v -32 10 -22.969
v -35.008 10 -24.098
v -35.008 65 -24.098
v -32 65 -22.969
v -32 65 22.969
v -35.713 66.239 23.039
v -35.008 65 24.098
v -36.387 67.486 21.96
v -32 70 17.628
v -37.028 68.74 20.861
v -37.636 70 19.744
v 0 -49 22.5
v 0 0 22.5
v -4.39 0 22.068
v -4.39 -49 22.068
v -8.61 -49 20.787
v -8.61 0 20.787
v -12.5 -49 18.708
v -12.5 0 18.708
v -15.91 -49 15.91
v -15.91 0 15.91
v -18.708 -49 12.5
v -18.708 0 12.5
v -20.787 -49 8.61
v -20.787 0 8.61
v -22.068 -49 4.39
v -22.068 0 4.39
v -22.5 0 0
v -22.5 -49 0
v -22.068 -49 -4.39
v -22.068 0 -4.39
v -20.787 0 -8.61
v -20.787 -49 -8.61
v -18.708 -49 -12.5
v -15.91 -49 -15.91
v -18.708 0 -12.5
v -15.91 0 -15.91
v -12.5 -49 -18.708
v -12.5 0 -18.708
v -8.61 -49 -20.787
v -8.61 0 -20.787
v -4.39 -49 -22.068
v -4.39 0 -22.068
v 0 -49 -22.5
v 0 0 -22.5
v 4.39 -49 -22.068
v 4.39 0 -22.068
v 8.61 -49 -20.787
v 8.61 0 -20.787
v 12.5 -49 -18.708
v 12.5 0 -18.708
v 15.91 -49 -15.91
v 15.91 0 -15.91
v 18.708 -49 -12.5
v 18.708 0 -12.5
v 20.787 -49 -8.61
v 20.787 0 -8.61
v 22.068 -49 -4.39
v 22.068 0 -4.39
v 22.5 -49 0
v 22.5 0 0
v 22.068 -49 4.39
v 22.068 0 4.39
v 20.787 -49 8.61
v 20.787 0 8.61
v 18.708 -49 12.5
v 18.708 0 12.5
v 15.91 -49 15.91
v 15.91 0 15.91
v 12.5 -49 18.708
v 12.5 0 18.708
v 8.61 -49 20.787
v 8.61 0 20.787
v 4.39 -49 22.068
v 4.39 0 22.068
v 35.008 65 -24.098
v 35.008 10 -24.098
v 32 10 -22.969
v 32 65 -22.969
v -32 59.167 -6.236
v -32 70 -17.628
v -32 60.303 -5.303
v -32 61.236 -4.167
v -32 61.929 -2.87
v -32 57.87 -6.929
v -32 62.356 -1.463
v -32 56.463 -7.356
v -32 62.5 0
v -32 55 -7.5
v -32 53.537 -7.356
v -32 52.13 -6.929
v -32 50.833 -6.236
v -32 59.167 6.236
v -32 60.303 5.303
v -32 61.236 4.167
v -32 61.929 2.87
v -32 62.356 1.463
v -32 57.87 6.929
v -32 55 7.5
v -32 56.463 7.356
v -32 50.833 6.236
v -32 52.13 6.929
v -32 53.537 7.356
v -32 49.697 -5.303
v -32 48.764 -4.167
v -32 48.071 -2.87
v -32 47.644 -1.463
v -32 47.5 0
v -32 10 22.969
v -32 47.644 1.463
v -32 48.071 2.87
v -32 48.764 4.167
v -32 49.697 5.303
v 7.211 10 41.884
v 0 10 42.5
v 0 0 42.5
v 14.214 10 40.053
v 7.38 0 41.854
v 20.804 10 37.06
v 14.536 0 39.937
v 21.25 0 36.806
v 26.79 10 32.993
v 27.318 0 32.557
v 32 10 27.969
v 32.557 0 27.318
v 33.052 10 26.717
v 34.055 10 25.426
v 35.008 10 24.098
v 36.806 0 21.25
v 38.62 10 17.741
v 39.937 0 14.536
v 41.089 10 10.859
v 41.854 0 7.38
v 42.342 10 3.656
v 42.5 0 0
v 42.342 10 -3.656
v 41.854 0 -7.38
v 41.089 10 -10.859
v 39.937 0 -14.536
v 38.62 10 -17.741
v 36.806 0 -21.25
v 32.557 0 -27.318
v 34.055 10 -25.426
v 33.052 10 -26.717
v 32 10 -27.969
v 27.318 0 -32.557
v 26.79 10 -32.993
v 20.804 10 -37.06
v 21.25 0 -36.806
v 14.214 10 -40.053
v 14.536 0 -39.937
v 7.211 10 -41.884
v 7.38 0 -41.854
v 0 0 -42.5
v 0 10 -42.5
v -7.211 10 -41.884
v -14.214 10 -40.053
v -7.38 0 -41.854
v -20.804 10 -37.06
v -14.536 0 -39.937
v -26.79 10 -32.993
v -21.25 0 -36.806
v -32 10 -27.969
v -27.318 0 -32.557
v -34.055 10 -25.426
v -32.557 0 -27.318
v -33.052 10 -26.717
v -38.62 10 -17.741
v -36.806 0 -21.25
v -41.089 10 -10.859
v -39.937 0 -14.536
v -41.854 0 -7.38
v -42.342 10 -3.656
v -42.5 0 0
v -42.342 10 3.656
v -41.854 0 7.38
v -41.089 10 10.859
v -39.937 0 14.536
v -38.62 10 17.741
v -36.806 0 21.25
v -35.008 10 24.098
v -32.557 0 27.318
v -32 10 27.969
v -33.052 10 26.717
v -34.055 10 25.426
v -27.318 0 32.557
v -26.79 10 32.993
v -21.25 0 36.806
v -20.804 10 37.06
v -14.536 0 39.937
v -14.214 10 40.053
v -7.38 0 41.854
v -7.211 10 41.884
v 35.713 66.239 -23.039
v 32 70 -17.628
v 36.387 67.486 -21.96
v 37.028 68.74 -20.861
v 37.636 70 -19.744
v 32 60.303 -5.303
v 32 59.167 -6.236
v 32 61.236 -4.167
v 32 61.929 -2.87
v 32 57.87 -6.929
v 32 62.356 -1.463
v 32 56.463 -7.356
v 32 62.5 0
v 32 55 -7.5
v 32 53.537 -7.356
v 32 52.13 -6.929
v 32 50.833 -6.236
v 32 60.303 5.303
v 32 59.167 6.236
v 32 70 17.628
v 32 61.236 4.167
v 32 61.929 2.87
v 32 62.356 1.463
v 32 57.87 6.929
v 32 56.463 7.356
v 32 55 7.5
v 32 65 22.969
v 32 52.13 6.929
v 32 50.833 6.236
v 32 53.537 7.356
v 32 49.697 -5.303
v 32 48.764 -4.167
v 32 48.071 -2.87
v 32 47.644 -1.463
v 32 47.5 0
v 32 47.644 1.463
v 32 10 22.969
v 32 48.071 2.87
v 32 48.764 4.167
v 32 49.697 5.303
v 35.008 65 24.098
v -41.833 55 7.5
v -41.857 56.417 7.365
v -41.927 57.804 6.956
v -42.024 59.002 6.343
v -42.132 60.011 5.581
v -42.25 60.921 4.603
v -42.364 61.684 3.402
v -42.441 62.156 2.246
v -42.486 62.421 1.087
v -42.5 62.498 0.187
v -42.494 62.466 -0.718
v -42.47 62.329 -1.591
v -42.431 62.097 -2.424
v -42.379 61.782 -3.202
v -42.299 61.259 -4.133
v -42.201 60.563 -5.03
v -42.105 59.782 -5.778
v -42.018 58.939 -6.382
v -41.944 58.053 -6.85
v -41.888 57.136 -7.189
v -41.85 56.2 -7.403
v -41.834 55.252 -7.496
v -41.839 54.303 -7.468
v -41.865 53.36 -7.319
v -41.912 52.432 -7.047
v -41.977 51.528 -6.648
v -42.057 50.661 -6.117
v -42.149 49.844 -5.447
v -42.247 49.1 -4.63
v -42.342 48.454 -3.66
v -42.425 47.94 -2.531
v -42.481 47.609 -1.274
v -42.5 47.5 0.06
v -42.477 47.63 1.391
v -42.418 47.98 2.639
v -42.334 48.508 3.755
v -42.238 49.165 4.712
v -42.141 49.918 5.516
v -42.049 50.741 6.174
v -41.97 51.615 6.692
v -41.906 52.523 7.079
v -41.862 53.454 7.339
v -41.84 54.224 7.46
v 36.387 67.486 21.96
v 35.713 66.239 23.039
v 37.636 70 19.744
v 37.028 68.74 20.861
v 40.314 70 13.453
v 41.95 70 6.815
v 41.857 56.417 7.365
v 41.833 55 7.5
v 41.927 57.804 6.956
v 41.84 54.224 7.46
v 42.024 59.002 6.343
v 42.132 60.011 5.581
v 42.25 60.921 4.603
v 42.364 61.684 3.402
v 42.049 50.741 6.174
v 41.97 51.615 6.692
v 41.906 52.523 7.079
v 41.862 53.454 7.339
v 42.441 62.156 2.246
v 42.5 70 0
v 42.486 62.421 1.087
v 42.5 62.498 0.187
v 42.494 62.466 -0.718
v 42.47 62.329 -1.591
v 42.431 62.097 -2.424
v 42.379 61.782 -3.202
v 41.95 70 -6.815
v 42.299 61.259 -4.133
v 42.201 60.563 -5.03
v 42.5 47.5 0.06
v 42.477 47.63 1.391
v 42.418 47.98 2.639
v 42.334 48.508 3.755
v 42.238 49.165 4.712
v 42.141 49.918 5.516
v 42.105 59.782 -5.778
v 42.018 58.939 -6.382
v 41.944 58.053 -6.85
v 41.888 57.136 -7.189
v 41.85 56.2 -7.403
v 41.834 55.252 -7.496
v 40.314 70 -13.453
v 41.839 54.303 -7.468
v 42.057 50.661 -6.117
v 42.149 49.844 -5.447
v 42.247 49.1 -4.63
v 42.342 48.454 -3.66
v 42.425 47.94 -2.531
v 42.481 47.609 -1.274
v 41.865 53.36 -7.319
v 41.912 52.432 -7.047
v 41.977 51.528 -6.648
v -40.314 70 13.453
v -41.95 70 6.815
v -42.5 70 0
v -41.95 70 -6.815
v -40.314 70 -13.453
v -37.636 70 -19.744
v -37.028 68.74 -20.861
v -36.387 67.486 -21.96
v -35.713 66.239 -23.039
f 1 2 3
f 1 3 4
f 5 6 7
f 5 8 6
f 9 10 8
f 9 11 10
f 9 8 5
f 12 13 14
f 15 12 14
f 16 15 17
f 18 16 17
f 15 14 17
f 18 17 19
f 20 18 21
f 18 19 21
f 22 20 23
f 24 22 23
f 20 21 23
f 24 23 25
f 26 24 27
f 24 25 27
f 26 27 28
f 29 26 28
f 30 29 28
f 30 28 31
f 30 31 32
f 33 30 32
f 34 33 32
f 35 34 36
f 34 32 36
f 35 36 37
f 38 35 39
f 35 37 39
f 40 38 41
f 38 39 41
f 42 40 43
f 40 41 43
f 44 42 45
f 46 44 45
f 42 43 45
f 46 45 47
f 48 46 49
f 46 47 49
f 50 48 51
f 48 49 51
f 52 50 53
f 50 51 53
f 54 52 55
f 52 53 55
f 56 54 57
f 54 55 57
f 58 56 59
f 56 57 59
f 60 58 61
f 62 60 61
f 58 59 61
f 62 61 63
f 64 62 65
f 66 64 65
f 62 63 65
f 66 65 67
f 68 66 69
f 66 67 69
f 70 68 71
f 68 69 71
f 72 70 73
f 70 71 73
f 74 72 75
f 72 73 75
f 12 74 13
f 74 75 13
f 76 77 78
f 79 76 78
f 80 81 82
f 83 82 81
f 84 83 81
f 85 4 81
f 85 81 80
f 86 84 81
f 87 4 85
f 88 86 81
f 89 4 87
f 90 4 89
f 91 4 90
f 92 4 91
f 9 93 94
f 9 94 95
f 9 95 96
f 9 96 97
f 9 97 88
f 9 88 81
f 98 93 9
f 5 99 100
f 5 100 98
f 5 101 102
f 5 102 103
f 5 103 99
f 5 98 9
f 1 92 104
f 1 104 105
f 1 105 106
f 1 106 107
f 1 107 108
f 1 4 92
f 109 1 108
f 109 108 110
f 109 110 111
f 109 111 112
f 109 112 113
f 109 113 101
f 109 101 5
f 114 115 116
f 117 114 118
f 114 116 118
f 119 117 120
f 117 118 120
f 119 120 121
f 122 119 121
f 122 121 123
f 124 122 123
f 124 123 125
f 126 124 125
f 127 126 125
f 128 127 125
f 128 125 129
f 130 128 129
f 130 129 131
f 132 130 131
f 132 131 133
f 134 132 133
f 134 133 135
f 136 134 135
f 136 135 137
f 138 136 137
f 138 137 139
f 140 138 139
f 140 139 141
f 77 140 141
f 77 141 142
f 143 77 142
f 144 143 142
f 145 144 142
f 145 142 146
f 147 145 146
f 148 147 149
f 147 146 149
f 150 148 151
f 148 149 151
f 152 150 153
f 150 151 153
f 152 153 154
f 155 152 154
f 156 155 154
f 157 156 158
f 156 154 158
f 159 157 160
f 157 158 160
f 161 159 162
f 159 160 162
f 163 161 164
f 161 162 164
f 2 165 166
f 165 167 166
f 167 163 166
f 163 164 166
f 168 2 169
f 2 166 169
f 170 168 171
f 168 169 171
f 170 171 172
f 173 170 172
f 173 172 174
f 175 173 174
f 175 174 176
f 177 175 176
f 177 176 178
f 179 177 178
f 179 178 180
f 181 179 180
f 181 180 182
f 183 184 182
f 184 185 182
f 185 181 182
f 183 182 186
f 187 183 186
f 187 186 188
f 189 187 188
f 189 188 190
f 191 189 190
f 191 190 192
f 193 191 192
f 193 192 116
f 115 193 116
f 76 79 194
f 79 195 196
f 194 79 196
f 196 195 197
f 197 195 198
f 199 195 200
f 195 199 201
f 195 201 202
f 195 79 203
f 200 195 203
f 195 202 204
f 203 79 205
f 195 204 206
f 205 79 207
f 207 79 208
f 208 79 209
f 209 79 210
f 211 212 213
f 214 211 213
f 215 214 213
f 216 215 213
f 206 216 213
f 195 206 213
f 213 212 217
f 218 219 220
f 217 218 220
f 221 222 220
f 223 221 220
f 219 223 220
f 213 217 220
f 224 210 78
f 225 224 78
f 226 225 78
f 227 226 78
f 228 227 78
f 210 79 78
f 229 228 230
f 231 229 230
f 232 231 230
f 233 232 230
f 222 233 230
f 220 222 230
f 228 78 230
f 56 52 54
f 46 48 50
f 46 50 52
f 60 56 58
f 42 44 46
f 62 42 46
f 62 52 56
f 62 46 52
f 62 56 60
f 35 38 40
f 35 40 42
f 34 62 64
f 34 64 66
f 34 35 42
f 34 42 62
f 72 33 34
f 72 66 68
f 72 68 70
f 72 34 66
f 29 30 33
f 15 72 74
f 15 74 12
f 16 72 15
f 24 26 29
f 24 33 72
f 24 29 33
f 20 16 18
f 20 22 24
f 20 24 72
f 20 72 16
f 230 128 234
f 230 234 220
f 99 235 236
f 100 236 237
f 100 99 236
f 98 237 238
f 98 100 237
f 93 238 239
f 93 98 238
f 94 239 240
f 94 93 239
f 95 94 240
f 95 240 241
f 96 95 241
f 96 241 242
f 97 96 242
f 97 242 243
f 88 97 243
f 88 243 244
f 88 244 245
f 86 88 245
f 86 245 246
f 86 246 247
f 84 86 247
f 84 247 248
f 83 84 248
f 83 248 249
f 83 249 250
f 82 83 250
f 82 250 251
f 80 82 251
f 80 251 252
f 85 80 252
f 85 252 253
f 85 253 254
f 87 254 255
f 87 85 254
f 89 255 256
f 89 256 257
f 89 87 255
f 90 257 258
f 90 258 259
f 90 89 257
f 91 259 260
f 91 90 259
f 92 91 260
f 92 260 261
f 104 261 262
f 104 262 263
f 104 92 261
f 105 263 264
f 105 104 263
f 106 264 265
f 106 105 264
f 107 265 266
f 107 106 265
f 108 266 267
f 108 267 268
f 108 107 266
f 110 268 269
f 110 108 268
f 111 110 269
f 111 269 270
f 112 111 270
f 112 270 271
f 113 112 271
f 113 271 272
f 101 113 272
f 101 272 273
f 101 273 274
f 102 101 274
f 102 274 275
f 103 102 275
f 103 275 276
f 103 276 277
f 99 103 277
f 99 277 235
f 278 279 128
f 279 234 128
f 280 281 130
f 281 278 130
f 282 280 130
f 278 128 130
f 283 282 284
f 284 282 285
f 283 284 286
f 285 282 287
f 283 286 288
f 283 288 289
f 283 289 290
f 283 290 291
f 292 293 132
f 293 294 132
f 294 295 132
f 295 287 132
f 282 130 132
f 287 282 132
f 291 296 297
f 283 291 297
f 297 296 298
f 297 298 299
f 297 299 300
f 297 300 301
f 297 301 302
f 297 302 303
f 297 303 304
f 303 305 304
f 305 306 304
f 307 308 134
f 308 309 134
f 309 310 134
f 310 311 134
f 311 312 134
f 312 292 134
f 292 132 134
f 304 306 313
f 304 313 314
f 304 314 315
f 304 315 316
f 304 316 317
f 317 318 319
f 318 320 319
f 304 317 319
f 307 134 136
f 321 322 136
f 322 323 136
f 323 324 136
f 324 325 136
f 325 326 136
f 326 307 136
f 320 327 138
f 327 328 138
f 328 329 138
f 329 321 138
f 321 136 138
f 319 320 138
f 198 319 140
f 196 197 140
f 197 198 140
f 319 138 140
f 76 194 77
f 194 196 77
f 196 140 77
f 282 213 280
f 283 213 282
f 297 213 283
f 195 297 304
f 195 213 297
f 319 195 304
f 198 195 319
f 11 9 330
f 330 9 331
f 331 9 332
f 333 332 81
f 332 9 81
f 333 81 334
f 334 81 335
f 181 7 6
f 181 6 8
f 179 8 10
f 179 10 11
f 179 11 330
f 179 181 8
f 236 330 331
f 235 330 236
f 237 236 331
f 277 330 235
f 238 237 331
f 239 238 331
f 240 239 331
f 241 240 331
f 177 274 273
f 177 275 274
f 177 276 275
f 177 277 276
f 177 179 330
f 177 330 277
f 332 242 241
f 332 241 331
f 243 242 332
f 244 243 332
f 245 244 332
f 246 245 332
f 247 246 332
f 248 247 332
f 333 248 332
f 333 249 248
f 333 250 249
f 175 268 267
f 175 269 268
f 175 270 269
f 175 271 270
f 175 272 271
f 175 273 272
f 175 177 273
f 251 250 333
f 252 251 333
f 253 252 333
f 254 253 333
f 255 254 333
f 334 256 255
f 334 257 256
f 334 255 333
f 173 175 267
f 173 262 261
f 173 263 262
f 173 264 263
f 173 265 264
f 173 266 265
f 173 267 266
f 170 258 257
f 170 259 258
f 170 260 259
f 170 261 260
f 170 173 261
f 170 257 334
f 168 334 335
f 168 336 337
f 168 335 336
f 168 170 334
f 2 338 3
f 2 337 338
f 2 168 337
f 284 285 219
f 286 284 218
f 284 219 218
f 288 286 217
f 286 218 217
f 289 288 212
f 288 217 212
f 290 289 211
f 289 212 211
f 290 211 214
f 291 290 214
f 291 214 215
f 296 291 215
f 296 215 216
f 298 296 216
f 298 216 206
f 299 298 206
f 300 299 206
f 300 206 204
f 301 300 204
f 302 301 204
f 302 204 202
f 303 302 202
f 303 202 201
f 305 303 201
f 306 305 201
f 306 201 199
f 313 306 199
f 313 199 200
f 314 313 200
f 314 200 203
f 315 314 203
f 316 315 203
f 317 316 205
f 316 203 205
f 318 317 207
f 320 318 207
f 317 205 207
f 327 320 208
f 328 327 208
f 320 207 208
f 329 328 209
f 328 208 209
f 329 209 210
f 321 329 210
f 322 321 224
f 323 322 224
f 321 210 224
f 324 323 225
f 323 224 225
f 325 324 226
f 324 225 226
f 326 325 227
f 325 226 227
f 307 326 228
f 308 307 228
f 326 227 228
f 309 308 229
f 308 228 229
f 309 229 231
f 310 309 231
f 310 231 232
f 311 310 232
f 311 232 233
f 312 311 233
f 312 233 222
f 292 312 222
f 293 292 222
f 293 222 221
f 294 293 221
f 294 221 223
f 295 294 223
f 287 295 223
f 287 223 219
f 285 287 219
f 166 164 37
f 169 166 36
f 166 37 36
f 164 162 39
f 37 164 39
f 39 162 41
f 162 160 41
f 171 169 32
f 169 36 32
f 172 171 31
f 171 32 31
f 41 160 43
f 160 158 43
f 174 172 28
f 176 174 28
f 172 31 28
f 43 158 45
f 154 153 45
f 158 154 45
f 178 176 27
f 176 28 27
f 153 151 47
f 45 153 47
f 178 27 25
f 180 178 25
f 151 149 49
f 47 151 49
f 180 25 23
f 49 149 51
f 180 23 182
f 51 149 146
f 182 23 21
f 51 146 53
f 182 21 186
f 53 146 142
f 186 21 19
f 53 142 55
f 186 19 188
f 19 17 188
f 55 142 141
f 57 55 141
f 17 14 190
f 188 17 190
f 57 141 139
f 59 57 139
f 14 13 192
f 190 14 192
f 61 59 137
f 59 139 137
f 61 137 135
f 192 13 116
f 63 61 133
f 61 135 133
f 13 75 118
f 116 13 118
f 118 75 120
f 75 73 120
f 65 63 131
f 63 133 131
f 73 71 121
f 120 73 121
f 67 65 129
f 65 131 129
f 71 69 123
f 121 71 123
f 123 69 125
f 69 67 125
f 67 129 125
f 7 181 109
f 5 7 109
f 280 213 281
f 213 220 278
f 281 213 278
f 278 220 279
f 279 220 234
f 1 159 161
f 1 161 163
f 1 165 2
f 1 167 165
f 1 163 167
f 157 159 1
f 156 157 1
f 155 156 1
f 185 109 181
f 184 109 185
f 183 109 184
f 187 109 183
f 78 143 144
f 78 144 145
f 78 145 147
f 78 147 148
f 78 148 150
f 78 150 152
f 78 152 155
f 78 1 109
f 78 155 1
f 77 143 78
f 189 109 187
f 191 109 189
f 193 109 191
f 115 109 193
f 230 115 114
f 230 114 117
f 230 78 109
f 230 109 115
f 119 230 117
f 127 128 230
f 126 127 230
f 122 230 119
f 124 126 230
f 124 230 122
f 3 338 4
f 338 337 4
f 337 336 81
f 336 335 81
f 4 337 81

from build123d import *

# Parameters (mm, degrees)
SKETCH1_R           = 42.5
BOSS_EXTRUDE1_DEPTH = 10
BOSS_EXTRUDE2_DEPTH = 60
SKETCH3_R           = 7.5
CUT_EXTRUDE1_DEPTH  = 111.709078219
SKETCH4_R           = 22.5
BOSS_EXTRUDE3_DEPTH = 49
CHAMFER1_SIZE       = 5
CHAMFER2_SIZE       = 5


with BuildPart() as part:
    # Sketch1 → Boss-Extrude1 (new body)
    with BuildSketch(Plane(origin=(0, 0, 0), x_dir=(1, 0, 0), z_dir=(0, 1, 0))):
        with Locations(Location((0, 0, 0), (0, 0, 270))):
            Circle(SKETCH1_R)
    extrude(amount=BOSS_EXTRUDE1_DEPTH)

    # Sketch2 → Boss-Extrude2 (add)
    with BuildSketch(Plane(origin=(0, 10, 0), x_dir=(1, 0, 0), z_dir=(0, 1, 0))):
        with BuildLine():
            Line((32, 27.968732542), (32, -27.968732542))
            ThreePointArc((32, -27.968732542), (42.5, 0), (32, 27.968732542))
        make_face()
    boss_extrude2 = extrude(amount=BOSS_EXTRUDE2_DEPTH)

    # Sketch3 → Cut-Extrude1 (cut, through all)
    with BuildSketch(Plane.ZY.offset(-32)):
        with Locations((0, 55)):
            Circle(SKETCH3_R)
    cut_extrude1 = extrude(amount=-CUT_EXTRUDE1_DEPTH, mode=Mode.SUBTRACT)

    # Mirror1: Boss-Extrude2, Cut-Extrude1 across plane
    add(boss_extrude2.mirror(Plane(origin=(0, 0, 0), x_dir=(0, 0, 1), z_dir=(1, 0, 0))))
    add(cut_extrude1.mirror(Plane(origin=(0, 0, 0), x_dir=(0, 0, 1), z_dir=(1, 0, 0))), mode=Mode.SUBTRACT)

    # Sketch4 → Boss-Extrude3 (add)
    with BuildSketch(Plane.XZ):
        with Locations(Location((0, 0, 0), (0, 0, 90))):
            Circle(SKETCH4_R)
    extrude(amount=BOSS_EXTRUDE3_DEPTH)

    # Chamfer1
    # the kernel refuses this chamfer: 5 mm, written as the material it takes off along each edge
    with BuildSketch(Plane(origin=(32, 10, -27.968732542), x_dir=(0.613569743675552, 0, 0.7896405319168447), z_dir=(0, 1, 0)), Plane(origin=(-32, 10, 27.968732542), x_dir=(-0.613569743675558, 0, -0.78964053191684), z_dir=(0, 1, 0))) as chamfer1_piece_1:
        with BuildLine():
            Line((4.902026088, 0), (CHAMFER1_SIZE * 0.789640531917, -CHAMFER1_SIZE * 0.613569743676))
            Line((CHAMFER1_SIZE * 0.789640531917, -CHAMFER1_SIZE * 0.613569743676), (0, 0))
            ThreePointArc((0, 0), (2.480684858, 0.070724564), (4.902026088, 0))
        make_face()
    extrude(amount=72.684374005, mode=Mode.SUBTRACT)
    with BuildSketch(Plane(origin=(32, 10, 27.968732542), x_dir=(0.6135697436755528, 0, -0.7896405319168441), z_dir=(0, 1, 0)), Plane(origin=(-32, 10, -27.968732542), x_dir=(-0.6135697436755566, 0, 0.7896405319168412), z_dir=(0, 1, 0))) as chamfer1_piece_2:
        with BuildLine():
            Line((4.902026088, 0), (CHAMFER1_SIZE * 0.789640531917, CHAMFER1_SIZE * 0.613569743676))
            Line((CHAMFER1_SIZE * 0.789640531917, CHAMFER1_SIZE * 0.613569743676), (0, 0))
            ThreePointArc((0, 0), (2.480684858, -0.070724564), (4.902026088, 0))
        make_face()
    extrude(amount=72.684374005, mode=Mode.SUBTRACT)

    # Chamfer2
    chamfer2_edges = [part.edges().sort_by_distance(p)[0] for p in [
        (33.503867445, 70, -23.533313298),
        (33.503867445, 70, 23.533313298),
        (-33.503867445, 70, 23.533313298),
        (-33.503867445, 70, -23.533313298),
    ]]
    chamfer(chamfer2_edges, length=CHAMFER2_SIZE)


solid = part.part
